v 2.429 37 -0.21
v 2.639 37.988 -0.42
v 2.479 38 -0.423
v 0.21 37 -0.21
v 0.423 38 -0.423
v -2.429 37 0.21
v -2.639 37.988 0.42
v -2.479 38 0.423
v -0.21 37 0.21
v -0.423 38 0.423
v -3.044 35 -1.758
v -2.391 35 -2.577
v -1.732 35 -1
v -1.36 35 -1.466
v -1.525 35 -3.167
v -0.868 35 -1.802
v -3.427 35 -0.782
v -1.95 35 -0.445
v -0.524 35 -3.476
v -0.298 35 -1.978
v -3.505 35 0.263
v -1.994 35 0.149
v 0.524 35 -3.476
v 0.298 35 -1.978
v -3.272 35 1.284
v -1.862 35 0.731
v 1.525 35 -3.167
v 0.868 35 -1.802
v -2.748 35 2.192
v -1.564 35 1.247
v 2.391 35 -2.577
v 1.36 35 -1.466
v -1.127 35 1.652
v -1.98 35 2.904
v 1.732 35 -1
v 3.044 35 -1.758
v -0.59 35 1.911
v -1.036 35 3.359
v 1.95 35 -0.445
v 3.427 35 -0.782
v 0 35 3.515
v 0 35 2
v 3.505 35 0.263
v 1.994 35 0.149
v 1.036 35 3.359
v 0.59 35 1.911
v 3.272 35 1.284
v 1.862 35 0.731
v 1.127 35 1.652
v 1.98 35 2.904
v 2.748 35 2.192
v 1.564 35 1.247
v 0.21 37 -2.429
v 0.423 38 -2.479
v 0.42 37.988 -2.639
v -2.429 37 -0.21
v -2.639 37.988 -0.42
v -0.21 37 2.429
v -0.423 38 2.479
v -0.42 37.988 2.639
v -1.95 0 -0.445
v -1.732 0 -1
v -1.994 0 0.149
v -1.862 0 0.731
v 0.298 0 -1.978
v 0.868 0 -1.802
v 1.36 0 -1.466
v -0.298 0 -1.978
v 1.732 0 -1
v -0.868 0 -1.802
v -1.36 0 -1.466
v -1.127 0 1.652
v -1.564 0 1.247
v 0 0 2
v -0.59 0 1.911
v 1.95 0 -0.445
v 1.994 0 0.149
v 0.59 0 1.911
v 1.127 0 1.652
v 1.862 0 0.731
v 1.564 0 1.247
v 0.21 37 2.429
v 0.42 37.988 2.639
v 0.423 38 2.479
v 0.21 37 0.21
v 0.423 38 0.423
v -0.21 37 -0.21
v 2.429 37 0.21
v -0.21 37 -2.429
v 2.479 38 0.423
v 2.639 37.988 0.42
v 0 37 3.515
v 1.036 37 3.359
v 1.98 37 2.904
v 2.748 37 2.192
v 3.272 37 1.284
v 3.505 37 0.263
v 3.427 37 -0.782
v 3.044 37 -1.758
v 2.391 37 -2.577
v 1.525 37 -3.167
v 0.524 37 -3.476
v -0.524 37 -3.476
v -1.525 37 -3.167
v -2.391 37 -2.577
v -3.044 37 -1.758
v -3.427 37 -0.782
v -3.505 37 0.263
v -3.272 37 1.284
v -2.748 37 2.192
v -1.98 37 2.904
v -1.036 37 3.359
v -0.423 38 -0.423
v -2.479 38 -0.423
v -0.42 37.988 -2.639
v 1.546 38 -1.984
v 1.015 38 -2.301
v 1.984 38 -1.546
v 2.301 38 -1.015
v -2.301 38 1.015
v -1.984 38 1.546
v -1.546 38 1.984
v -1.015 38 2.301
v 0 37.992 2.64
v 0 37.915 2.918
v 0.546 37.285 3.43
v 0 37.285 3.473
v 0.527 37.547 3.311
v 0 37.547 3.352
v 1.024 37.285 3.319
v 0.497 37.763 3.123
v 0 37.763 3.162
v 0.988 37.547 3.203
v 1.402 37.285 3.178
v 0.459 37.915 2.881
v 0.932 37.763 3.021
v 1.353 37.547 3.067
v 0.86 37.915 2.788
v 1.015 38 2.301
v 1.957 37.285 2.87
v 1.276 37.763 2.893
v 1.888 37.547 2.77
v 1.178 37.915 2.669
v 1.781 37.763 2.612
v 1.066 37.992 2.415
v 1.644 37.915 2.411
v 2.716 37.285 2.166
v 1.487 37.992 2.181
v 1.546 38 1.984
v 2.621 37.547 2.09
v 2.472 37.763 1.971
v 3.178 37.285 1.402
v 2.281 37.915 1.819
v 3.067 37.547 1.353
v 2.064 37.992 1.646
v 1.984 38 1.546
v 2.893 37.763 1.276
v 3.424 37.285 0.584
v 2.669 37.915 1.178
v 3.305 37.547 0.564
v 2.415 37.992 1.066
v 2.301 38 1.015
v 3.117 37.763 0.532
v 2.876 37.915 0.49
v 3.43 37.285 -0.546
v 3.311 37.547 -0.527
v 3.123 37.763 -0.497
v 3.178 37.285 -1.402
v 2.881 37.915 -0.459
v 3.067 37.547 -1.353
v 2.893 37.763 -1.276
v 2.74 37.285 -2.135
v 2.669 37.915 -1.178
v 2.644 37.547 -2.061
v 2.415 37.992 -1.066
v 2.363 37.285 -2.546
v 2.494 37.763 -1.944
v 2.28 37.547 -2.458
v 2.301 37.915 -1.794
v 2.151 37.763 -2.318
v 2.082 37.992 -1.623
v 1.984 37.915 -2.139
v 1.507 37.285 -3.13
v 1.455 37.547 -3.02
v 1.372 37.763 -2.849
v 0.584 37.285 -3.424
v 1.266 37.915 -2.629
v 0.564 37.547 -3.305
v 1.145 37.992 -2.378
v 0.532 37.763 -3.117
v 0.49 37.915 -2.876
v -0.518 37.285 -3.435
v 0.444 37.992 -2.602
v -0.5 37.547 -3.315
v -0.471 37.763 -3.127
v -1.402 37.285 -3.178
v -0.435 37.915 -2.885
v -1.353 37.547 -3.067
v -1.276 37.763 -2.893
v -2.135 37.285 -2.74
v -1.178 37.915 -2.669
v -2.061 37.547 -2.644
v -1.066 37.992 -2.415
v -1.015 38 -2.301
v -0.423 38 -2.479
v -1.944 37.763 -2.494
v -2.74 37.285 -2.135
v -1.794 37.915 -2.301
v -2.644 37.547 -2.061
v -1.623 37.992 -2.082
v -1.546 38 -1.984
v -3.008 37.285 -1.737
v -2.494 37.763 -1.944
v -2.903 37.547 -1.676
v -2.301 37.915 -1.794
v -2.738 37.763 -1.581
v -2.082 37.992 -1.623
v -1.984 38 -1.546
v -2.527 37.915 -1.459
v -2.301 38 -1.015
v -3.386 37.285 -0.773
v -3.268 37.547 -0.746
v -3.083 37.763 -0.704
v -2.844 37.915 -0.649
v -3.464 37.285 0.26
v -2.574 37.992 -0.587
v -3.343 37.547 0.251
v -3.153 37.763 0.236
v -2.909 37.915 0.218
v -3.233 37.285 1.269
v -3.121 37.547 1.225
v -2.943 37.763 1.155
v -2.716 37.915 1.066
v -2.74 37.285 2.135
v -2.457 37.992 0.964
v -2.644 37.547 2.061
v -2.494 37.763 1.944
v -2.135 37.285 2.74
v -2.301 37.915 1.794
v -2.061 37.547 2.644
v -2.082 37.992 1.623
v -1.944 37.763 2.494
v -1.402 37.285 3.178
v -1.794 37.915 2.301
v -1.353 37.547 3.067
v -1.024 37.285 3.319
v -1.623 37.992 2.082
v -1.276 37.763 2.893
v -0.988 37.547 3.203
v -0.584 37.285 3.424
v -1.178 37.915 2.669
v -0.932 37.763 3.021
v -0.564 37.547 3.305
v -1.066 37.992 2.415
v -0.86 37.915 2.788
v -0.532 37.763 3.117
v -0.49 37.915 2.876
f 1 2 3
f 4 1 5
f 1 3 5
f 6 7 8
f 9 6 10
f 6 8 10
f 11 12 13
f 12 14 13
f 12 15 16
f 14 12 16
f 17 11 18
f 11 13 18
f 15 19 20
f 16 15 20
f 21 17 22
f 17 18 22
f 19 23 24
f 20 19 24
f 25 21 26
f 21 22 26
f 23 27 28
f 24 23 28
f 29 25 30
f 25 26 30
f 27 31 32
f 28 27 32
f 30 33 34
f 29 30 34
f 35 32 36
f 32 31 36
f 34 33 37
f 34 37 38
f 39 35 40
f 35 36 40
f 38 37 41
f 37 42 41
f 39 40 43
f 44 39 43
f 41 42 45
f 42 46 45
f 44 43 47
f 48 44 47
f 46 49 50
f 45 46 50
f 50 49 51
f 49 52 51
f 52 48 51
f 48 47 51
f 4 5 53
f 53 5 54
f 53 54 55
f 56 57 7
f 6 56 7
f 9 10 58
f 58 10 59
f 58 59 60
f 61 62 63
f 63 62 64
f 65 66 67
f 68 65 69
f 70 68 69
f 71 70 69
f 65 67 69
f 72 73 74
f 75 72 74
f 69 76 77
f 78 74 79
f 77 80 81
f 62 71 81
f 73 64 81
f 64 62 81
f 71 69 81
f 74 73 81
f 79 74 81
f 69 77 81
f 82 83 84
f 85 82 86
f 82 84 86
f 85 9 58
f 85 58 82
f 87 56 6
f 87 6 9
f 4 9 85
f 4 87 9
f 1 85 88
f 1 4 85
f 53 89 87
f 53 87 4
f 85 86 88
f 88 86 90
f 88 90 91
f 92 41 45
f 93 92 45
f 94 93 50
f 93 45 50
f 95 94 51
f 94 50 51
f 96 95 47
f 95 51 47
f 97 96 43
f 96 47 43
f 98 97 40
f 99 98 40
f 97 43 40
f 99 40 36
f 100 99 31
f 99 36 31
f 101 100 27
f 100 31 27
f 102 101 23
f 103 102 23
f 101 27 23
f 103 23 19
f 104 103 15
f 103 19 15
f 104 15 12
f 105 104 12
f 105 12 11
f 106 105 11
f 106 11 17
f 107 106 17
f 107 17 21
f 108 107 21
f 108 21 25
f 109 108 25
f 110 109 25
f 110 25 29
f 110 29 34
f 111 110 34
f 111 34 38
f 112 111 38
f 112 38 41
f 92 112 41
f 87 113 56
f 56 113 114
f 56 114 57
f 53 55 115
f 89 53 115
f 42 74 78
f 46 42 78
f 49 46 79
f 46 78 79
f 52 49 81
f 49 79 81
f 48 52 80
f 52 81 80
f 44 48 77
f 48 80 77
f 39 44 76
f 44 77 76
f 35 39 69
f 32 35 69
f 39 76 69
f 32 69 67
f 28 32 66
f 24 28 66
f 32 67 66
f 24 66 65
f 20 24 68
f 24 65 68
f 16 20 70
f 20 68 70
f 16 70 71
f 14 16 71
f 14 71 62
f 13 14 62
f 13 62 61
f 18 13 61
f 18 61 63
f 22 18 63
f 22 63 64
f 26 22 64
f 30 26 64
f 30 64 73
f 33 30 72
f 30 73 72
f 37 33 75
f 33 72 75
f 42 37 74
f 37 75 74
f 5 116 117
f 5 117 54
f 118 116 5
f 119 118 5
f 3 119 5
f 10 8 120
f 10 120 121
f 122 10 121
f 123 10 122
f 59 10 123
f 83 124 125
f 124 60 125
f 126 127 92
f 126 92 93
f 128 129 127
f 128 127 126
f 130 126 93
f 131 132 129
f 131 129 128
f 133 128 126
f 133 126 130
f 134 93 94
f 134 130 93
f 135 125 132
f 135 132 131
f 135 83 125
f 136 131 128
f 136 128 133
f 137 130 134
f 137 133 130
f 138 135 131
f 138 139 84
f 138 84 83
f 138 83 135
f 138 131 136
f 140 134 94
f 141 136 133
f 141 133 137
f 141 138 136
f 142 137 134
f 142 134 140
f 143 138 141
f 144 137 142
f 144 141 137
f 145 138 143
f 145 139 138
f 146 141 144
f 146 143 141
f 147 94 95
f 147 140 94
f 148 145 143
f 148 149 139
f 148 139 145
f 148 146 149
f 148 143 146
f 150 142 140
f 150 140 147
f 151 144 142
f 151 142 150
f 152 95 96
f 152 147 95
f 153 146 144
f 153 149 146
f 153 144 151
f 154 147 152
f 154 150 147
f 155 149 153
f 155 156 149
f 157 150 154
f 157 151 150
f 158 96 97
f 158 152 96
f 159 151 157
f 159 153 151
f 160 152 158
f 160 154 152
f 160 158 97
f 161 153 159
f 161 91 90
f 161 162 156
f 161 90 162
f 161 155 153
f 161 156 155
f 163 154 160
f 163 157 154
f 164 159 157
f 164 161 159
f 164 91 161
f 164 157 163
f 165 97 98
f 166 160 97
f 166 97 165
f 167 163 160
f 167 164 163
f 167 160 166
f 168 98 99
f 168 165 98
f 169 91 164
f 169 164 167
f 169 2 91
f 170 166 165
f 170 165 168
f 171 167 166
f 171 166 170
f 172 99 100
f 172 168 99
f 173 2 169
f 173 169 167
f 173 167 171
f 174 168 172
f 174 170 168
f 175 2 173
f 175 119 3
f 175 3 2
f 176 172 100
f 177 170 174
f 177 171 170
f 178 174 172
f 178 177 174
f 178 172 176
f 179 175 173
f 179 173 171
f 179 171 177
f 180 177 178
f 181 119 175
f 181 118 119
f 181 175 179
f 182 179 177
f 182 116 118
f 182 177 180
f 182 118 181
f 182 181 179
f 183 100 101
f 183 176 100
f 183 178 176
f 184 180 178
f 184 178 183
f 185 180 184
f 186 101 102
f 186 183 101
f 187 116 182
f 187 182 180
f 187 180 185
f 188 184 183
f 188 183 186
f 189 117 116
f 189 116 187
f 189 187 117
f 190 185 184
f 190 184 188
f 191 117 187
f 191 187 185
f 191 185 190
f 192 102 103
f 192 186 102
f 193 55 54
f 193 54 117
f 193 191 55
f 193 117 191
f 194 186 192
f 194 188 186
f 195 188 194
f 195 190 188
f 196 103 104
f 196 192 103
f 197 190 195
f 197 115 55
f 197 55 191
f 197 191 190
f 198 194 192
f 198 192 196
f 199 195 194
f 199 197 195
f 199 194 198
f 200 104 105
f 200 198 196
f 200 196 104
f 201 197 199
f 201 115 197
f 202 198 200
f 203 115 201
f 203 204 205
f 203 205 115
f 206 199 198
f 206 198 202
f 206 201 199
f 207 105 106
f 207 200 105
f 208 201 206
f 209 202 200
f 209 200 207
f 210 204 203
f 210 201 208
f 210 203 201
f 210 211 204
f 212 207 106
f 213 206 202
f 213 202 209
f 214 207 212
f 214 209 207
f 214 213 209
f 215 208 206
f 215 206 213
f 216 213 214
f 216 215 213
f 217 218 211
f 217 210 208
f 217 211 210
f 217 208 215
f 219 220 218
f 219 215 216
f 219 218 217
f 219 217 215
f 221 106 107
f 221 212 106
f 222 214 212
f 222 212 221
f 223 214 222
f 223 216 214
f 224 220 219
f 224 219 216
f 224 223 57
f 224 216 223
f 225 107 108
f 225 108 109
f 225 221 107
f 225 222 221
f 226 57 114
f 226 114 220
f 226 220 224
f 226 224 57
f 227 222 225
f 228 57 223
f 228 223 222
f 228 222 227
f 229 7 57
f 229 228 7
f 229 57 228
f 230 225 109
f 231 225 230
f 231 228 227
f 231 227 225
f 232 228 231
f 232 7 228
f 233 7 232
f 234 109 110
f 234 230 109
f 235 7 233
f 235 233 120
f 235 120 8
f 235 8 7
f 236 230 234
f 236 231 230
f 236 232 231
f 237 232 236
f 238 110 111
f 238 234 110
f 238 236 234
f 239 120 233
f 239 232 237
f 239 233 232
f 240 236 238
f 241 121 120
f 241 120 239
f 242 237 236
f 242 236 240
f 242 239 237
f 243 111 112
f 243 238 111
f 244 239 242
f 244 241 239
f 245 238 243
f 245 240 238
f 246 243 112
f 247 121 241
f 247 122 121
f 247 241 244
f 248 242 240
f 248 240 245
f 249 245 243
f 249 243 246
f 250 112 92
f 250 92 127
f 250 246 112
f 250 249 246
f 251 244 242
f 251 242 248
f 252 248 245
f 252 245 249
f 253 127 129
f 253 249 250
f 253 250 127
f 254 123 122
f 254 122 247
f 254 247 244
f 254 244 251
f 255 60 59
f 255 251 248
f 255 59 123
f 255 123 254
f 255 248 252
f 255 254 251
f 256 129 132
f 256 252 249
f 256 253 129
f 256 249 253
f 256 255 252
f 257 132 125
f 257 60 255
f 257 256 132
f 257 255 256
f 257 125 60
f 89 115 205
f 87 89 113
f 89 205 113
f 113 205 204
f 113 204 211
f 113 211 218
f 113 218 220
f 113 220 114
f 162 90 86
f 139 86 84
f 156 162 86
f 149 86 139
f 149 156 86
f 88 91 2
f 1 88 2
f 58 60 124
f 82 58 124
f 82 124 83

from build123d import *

# Parameters (mm, degrees)
SKETCH_1_R          = 2
EXTRUDE_1_DEPTH     = 35
SKETCH_2_R          = 3.515
EXTRUDE_2_DEPTH     = 3
CUT_EXTRUDE_1_DEPTH = 1
CUT_EXTRUDE_1_DRAFT = -12
FILLET_2_R          = 1


with BuildPart() as part:
    # Эскиз1 → Бобышка-Вытянуть1 (new body)
    with BuildSketch(Plane(origin=(0, 0, 0), x_dir=(1, 0, 0), z_dir=(0, 1, 0))):
        with Locations(Location((0, 0, 0), (0, 0, 270))):
            Circle(SKETCH_1_R)
    extrude(amount=EXTRUDE_1_DEPTH)

    # Эскиз2 → Бобышка-Вытянуть2 (add)
    with BuildSketch(Plane(origin=(0, 35, 0), x_dir=(1, 0, 0), z_dir=(0, 1, 0))):
        with Locations(Location((0, 0, 0), (0, 0, 270))):
            Circle(SKETCH_2_R)
    extrude(amount=EXTRUDE_2_DEPTH)


with BuildPart() as cut_extrude_1_tool:
    # Эскиз3 → Вырез-Вытянуть1 (with draft: the straight prism first)
    with BuildSketch(Plane(origin=(0, 38, 0), x_dir=(1, 0, 0), z_dir=(0, 1, 0))):
        Polygon((-2.641549473, 0.422769916), (-2.641549473, -0.422769916), (-0.422769916, -0.422769916), (-0.422769916, -2.641549473), (0.422769916, -2.641549473), (0.422769916, -0.422769916), (2.641549473, -0.422769916), (2.641549473, 0.422769916), (0.422769916, 0.422769916), (0.422769916, 2.641549473), (-0.422769916, 2.641549473), (-0.422769916, 0.422769916), align=None)
    extrude(amount=-CUT_EXTRUDE_1_DEPTH)
    # Вырез-Вытянуть1: the draft: its side faces are tilted about the plane it starts from
    cut_extrude_1_sides = [cut_extrude_1_tool.faces().sort_by_distance(p)[0] for p in [
        (-2.641549473, 37.5, 0),
        (-1.532159694, 37.5, 0.422769916),
        (-0.422769916, 37.5, 1.532159694),
        (0, 37.5, 2.641549473),
        (0.422769916, 37.5, 1.532159694),
        (1.532159694, 37.5, 0.422769916),
        (2.641549473, 37.5, 0),
        (1.532159694, 37.5, -0.422769916),
        (0.422769916, 37.5, -1.532159694),
        (0, 37.5, -2.641549473),
        (-0.422769916, 37.5, -1.532159694),
        (-1.532159694, 37.5, -0.422769916),
    ]]
    draft(cut_extrude_1_sides, Plane(origin=(0, 38, 0), x_dir=(1, 0, 0), z_dir=(0, 1, 0)), CUT_EXTRUDE_1_DRAFT)


with BuildPart() as part_1:
    add(part.part)

    # Вырез-Вытянуть1: cut by cut_extrude_1_tool
    add(cut_extrude_1_tool.part, mode=Mode.SUBTRACT)

    # Скругление2
    # the kernel refuses this fillet: 1 mm, written as the material it takes off along each edge
    with BuildSketch(Plane(origin=(0, 38, 0), x_dir=(0, 0, 1), z_dir=(-1, 0, 0))) as fillet_2_piece_1:
        with BuildLine():
            CenterArc((3.515 - FILLET_2_R, -FILLET_2_R), FILLET_2_R, 0, 90)
            Line((3.515 - FILLET_2_R, 0), (3.515, 0))
            Line((3.515, 0), (3.515, -FILLET_2_R))
        make_face()
    revolve(axis=Axis((0, 38, 0), (0, 1, 0)), mode=Mode.SUBTRACT)


solid = part_1.part
